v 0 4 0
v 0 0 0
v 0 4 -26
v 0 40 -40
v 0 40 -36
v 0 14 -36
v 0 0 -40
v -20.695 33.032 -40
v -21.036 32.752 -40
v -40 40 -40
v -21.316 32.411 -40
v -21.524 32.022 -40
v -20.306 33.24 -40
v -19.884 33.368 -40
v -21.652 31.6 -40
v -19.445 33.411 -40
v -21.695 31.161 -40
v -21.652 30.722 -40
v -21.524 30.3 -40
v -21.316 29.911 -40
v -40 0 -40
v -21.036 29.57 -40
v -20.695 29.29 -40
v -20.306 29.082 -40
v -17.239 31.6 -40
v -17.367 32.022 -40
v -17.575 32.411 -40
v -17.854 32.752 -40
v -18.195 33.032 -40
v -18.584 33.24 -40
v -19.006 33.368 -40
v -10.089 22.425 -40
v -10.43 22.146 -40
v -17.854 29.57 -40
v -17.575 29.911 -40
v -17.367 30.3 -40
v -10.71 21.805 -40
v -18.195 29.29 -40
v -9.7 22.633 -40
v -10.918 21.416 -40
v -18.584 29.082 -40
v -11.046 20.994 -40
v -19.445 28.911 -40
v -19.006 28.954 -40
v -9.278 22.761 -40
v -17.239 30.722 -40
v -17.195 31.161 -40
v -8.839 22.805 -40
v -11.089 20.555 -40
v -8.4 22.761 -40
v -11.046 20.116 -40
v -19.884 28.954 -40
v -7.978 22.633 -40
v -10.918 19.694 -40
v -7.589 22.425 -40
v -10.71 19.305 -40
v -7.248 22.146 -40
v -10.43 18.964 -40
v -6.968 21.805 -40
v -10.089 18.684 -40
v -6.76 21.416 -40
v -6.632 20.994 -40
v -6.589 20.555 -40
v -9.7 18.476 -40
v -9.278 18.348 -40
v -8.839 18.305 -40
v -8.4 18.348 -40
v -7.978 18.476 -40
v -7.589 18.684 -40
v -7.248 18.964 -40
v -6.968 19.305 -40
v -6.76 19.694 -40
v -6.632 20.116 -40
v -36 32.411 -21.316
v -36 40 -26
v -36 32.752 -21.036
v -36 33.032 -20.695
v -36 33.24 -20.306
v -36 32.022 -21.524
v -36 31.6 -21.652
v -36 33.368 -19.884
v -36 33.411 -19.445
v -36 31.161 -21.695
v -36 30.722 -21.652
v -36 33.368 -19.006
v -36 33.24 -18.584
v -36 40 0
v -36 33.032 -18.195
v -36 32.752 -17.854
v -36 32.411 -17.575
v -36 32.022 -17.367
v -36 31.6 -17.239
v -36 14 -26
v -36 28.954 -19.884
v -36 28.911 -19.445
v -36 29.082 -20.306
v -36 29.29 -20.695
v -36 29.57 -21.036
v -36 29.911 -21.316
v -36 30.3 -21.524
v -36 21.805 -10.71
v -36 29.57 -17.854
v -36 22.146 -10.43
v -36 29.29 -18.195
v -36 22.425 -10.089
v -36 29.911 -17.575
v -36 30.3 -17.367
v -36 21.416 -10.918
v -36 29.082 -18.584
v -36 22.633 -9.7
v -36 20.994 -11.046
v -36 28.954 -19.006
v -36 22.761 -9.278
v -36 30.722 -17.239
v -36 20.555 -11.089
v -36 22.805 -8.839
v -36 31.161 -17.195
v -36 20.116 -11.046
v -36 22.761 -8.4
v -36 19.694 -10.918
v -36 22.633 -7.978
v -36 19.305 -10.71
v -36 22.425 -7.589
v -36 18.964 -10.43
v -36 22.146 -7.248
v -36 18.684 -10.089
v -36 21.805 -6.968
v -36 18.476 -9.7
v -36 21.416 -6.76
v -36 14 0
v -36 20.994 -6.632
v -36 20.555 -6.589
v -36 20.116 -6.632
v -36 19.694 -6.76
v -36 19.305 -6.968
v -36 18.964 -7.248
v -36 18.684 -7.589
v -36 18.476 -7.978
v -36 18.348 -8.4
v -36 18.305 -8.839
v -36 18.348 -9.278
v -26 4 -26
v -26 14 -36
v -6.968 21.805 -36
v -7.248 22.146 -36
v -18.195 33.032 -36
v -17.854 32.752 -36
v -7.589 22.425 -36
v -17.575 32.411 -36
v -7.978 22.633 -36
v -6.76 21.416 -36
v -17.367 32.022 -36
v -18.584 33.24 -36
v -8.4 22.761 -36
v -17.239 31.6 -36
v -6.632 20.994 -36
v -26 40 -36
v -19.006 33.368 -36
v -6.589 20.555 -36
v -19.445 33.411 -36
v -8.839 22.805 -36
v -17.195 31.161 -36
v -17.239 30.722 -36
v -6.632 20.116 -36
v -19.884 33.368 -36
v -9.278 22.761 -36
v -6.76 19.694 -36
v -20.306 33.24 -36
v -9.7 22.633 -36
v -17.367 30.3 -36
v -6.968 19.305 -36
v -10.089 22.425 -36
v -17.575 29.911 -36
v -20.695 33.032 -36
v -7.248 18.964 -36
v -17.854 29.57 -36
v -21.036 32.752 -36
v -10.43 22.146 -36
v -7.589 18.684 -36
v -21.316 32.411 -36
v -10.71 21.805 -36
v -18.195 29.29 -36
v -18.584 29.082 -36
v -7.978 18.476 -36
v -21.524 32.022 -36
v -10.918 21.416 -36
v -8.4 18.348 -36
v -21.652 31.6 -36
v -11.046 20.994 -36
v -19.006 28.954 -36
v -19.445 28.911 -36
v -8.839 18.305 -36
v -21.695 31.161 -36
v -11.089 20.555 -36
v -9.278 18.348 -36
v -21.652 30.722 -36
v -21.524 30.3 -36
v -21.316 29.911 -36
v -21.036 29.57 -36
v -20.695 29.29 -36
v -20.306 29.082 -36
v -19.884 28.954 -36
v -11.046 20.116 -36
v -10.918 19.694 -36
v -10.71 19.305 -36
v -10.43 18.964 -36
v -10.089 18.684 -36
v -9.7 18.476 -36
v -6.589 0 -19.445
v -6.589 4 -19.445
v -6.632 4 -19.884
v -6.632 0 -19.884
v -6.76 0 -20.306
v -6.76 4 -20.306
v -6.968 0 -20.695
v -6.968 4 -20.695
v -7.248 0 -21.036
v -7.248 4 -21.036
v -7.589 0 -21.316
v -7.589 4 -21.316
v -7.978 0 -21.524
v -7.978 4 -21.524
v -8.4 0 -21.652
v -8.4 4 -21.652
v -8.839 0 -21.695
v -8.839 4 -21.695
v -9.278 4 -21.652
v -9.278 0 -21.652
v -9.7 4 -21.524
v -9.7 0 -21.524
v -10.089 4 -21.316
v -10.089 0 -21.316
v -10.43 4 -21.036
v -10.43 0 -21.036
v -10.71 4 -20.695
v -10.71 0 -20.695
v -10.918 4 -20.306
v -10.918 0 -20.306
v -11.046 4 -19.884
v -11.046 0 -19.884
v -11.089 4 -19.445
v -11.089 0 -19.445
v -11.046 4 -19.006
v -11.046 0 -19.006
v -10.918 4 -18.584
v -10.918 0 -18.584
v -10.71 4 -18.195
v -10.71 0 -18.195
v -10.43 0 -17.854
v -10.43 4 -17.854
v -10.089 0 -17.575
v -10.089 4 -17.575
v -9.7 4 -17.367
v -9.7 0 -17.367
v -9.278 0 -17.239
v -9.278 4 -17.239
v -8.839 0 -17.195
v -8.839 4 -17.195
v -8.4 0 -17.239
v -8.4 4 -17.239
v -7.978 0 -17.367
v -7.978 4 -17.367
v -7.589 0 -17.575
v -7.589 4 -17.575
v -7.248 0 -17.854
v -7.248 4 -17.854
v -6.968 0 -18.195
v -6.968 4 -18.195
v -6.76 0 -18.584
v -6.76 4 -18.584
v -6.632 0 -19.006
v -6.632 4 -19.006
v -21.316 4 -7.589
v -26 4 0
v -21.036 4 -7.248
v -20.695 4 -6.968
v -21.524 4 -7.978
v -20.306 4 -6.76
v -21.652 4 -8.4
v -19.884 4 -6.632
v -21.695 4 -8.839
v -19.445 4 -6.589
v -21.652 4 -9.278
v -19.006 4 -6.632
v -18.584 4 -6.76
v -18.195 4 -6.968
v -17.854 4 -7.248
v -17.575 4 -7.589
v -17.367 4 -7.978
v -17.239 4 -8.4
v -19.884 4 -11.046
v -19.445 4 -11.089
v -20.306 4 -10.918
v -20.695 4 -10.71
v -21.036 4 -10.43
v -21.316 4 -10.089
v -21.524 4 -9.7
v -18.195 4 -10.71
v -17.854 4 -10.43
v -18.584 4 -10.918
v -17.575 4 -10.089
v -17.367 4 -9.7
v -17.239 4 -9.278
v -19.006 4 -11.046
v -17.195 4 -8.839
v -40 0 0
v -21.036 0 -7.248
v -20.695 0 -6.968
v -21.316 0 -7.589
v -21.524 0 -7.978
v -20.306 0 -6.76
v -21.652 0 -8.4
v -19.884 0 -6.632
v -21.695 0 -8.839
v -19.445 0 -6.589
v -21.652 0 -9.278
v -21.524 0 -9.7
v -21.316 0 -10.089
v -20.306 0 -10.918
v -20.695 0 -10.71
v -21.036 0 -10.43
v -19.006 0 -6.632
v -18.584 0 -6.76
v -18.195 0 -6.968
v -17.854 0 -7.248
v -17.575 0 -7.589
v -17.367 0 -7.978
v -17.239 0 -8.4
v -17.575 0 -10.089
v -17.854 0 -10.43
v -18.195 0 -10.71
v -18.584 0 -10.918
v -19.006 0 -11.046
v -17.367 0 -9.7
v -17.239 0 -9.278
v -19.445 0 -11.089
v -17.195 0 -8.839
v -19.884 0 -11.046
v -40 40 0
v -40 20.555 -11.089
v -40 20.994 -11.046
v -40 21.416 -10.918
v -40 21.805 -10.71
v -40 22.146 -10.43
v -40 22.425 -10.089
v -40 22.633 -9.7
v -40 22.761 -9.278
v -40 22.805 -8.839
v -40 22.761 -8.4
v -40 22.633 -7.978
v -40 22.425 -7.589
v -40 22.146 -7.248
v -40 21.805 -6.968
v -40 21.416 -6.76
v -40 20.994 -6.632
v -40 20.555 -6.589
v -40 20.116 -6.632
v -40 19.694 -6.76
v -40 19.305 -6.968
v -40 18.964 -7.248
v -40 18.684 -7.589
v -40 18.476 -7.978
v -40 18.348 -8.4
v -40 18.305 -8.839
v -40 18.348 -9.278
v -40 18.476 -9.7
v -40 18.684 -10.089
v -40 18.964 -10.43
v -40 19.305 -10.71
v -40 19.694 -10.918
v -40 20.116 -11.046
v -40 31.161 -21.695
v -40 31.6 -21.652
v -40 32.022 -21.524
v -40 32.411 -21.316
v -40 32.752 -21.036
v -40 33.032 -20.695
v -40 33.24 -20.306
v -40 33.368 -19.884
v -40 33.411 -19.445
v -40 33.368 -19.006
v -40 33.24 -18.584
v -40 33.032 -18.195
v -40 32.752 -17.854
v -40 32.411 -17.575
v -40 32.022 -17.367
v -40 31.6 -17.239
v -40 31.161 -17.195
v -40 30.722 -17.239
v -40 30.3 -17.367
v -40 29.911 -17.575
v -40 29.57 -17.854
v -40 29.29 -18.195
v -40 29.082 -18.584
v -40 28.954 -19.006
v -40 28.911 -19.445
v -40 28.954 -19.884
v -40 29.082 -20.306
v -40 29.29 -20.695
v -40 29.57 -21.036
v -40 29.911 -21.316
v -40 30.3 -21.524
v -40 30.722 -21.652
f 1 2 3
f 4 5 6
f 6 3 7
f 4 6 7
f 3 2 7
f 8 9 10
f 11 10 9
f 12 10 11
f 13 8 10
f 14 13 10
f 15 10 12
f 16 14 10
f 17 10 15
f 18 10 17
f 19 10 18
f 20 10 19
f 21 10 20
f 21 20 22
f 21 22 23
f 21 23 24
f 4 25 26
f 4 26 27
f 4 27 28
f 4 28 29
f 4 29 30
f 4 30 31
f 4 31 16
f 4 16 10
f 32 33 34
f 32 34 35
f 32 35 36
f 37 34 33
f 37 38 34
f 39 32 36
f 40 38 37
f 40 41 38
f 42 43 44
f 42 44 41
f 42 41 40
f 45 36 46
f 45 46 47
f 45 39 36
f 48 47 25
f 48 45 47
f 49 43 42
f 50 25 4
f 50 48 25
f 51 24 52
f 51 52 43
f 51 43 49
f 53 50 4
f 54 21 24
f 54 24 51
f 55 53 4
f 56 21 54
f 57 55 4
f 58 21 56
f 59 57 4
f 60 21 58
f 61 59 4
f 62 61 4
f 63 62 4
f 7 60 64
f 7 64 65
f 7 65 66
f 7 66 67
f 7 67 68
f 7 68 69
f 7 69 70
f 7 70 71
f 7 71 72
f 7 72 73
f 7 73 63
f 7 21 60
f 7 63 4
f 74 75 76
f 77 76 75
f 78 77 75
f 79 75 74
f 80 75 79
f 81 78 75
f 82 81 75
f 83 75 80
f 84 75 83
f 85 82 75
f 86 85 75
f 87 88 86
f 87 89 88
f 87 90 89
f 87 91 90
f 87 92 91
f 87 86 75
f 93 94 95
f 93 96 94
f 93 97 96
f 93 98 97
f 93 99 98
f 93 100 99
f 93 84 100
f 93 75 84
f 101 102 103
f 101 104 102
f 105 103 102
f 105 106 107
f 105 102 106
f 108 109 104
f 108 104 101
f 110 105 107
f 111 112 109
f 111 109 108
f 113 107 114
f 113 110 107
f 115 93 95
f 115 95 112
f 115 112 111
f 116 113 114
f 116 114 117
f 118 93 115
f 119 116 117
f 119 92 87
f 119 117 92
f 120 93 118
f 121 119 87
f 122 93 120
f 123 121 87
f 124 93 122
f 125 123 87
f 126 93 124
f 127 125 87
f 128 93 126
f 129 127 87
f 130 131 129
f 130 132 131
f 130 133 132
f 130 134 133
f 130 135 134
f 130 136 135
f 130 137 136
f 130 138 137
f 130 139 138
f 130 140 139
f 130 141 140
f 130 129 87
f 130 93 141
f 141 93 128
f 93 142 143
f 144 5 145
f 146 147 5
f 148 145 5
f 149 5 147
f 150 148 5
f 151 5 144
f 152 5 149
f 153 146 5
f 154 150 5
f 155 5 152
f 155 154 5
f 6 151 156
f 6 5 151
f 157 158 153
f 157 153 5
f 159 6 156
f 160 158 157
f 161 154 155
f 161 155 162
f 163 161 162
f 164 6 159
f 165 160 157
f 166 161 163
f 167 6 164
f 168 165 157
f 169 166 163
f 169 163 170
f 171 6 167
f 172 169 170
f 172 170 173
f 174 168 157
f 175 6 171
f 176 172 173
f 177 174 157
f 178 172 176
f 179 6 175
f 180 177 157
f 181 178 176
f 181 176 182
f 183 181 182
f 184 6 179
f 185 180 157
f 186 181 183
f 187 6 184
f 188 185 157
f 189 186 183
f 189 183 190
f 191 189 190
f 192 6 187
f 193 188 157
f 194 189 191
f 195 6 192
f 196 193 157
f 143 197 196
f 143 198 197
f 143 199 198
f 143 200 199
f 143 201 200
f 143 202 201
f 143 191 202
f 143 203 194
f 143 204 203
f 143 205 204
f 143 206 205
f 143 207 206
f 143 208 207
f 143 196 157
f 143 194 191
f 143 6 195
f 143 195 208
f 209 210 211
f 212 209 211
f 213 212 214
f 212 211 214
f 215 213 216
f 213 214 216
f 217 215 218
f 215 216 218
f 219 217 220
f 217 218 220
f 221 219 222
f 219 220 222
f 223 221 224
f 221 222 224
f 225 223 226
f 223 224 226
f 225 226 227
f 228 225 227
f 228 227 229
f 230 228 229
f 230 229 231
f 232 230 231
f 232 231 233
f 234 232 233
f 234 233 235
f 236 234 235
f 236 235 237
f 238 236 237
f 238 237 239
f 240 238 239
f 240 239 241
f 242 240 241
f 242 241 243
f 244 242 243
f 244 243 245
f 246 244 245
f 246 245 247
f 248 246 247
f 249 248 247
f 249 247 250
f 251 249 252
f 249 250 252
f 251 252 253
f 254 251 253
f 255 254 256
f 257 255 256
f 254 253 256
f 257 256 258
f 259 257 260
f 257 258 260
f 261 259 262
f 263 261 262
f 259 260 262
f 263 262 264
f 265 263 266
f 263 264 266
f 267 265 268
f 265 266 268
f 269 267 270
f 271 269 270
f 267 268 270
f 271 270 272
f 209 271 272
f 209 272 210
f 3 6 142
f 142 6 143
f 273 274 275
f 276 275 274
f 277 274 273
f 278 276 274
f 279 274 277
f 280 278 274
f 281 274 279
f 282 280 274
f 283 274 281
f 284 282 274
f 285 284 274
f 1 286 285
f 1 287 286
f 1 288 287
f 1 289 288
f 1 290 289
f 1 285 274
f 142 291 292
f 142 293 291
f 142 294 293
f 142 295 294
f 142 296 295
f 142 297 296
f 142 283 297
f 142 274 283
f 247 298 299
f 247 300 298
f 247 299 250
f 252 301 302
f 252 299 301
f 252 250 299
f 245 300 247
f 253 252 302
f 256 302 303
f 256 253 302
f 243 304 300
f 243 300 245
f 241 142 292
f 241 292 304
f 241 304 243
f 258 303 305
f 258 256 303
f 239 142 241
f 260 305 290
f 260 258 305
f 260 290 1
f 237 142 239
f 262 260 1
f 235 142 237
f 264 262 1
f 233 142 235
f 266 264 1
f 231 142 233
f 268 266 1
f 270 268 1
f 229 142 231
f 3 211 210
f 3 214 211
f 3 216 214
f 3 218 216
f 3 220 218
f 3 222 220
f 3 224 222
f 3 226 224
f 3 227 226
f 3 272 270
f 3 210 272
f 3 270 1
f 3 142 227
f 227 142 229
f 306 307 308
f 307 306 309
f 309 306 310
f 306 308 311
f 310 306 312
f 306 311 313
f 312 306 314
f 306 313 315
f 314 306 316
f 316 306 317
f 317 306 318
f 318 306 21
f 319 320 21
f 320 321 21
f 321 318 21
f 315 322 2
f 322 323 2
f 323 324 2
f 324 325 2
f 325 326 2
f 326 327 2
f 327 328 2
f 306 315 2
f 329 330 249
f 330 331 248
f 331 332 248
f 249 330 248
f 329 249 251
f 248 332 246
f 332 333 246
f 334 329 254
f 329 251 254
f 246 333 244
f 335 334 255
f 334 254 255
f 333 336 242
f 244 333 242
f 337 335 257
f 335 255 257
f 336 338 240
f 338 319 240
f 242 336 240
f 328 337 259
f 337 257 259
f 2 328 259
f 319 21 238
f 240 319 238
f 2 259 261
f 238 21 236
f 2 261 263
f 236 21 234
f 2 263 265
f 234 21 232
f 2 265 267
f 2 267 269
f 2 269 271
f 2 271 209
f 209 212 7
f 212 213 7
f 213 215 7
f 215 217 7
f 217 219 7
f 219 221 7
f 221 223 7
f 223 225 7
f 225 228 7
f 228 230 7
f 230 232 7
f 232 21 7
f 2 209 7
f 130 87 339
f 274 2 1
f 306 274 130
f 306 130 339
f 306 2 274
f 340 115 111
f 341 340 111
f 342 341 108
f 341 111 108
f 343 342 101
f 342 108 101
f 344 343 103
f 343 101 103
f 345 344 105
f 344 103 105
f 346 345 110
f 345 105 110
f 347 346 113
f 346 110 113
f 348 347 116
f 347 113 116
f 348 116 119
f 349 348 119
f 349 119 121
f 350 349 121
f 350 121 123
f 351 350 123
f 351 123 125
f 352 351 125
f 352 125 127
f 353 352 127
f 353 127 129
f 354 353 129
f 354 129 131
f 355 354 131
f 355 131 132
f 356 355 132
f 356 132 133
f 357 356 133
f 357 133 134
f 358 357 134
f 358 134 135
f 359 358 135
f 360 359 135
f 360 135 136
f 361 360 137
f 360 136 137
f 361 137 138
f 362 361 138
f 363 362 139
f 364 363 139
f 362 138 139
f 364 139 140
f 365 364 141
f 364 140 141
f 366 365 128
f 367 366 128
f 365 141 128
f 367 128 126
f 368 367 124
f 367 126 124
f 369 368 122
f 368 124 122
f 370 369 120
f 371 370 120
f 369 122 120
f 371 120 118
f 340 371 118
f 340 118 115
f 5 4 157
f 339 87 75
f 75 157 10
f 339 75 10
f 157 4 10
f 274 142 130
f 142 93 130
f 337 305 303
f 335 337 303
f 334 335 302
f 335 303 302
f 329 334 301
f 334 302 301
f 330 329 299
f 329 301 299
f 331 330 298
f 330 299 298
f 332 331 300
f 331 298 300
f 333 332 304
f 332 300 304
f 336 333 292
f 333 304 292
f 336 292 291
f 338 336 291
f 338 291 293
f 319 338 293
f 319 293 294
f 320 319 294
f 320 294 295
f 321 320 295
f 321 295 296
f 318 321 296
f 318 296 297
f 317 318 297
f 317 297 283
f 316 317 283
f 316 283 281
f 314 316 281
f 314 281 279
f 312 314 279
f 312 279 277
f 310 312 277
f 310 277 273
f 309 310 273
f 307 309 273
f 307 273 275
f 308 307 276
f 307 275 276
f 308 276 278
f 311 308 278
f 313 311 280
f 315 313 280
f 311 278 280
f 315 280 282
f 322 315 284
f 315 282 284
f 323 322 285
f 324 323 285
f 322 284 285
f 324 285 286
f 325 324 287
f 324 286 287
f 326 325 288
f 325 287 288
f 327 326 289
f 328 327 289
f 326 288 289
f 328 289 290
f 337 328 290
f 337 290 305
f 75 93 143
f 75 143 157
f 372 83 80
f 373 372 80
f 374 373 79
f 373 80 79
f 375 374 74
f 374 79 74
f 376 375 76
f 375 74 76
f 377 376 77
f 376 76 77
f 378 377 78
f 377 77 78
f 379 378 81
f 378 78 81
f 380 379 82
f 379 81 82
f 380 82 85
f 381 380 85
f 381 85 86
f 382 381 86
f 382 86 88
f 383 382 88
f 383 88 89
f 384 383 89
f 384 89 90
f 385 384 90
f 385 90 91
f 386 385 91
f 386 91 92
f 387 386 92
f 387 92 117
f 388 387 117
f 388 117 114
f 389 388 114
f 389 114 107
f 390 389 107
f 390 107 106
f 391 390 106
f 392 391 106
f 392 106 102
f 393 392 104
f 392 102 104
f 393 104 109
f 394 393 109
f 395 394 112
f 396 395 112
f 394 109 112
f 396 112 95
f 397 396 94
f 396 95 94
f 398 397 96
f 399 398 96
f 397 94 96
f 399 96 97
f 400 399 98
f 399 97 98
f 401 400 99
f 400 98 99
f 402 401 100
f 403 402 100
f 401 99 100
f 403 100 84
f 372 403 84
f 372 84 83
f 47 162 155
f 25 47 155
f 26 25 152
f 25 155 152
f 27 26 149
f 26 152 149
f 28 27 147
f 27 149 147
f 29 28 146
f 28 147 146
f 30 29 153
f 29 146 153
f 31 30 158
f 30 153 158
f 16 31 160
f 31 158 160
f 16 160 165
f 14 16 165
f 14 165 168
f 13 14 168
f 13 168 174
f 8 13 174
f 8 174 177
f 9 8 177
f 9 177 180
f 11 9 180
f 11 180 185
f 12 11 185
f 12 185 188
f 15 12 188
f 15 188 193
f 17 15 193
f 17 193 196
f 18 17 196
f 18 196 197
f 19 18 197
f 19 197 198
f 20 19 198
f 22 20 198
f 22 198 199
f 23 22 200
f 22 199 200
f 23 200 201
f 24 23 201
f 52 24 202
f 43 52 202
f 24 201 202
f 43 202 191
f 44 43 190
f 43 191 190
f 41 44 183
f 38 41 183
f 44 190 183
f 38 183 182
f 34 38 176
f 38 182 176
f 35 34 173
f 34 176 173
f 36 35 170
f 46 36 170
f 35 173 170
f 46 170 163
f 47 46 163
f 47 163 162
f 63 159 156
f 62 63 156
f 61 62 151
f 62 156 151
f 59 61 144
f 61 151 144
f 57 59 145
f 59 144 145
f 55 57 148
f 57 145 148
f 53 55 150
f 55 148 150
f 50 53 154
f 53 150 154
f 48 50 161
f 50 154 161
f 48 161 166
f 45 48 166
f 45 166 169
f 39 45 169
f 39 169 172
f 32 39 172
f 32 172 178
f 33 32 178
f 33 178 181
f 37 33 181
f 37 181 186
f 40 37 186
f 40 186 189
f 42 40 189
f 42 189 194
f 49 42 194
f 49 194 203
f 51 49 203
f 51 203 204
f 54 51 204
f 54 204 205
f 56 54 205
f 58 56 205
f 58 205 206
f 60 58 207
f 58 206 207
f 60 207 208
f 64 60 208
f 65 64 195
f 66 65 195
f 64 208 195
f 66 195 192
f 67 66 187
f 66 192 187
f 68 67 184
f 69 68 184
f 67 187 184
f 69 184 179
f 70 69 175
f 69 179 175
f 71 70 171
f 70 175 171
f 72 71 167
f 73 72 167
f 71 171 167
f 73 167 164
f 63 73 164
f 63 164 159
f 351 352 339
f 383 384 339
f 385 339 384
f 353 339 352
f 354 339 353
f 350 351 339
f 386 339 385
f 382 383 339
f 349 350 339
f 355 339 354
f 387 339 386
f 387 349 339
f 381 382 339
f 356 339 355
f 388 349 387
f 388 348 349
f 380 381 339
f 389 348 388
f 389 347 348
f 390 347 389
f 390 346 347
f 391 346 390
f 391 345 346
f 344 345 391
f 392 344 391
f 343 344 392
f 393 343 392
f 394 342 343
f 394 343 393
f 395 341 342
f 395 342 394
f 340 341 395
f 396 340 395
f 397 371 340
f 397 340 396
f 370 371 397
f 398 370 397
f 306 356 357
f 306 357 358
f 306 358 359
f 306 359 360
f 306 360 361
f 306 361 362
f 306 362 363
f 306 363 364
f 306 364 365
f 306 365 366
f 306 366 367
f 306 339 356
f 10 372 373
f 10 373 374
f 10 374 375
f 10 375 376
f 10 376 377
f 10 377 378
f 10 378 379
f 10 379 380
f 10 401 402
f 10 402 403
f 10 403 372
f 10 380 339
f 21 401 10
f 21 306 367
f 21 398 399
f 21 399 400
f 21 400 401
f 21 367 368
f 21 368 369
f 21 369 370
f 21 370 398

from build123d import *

# Parameters (mm, degrees)
SCHIZZO1_W                   = 40
SCHIZZO1_H                   = 40
ESTRUSIONE_ESTRUSIONE1_DEPTH = 4
ESTRUSIONE_ESTRUSIONE2_DEPTH = 36
SMUSSO1_SIZE                 = 10
FORO_PER_VITE_M4_1_D         = 4.5
FORO_PER_VITE_M4_1_DEPTH     = 9
FORO_PER_VITE_M4_1_TIP       = 1.351936393
FORO_PER_VITE_M4_2_D         = 4.5
FORO_PER_VITE_M4_2_DEPTH     = 9
FORO_PER_VITE_M4_2_TIP       = 1.351936393
FORO_PER_VITE_M4_3_D         = 4.5
FORO_PER_VITE_M4_3_DEPTH     = 9
FORO_PER_VITE_M4_3_TIP       = 1.351936393


with BuildPart() as part:
    # Schizzo1 → Estrusione-Estrusione1 (new body)
    with BuildSketch(Plane(origin=(0, 0, 0), x_dir=(1, 0, 0), z_dir=(0, 1, 0))):
        with Locations((-20, 20)):
            Rectangle(SCHIZZO1_W, SCHIZZO1_H)
    extrude(amount=ESTRUSIONE_ESTRUSIONE1_DEPTH)

    # Schizzo2 → Estrusione-Estrusione2 (add)
    with BuildSketch(Plane(origin=(0, 4, 0), x_dir=(1, 0, 0), z_dir=(0, 1, 0))):
        Polygon((-36, 0), (-40, 0), (-40, 40), (0, 40), (0, 36), (-36, 36), align=None)
    extrude(amount=ESTRUSIONE_ESTRUSIONE2_DEPTH)

    # Smusso1
    smusso1_edges = [part.edges().sort_by_distance(p)[0] for p in [
        (-36, 4, -18),
        (-18, 4, -36),
        (-36, 22, -36),
    ]]
    chamfer(smusso1_edges, length=SMUSSO1_SIZE)

    # Foro per Vite M4-1
    with Locations(Plane(origin=(0, 0, 0), x_dir=(-1, 0, 0), z_dir=(0, -1, 0))):
        with Locations((8.838834765, 19.445436483), (19.445436483, 8.838834765)):
            Hole(FORO_PER_VITE_M4_1_D / 2, depth=FORO_PER_VITE_M4_1_DEPTH)
            with Locations((0, 0, -(FORO_PER_VITE_M4_1_DEPTH + FORO_PER_VITE_M4_1_TIP / 2))):  # 118° drill point
                Cone(0, FORO_PER_VITE_M4_1_D / 2, FORO_PER_VITE_M4_1_TIP, mode=Mode.SUBTRACT)

    # Foro per Vite M4-2
    with Locations(Plane(origin=(0, 0, -40), x_dir=(-1, 0, 0), z_dir=(0, 0, -1))):
        with Locations((8.838834765, 20.554563517), (19.445436483, 31.161165235)):
            Hole(FORO_PER_VITE_M4_2_D / 2, depth=FORO_PER_VITE_M4_2_DEPTH)
            with Locations((0, 0, -(FORO_PER_VITE_M4_2_DEPTH + FORO_PER_VITE_M4_2_TIP / 2))):  # 118° drill point
                Cone(0, FORO_PER_VITE_M4_2_D / 2, FORO_PER_VITE_M4_2_TIP, mode=Mode.SUBTRACT)

    # Foro per Vite M4-3
    with Locations(Plane.ZY.offset(40)):
        with Locations((-19.445436483, 31.161165235), (-8.838834765, 20.554563517)):
            Hole(FORO_PER_VITE_M4_3_D / 2, depth=FORO_PER_VITE_M4_3_DEPTH)
            with Locations((0, 0, -(FORO_PER_VITE_M4_3_DEPTH + FORO_PER_VITE_M4_3_TIP / 2))):  # 118° drill point
                Cone(0, FORO_PER_VITE_M4_3_D / 2, FORO_PER_VITE_M4_3_TIP, mode=Mode.SUBTRACT)


solid = part.part
